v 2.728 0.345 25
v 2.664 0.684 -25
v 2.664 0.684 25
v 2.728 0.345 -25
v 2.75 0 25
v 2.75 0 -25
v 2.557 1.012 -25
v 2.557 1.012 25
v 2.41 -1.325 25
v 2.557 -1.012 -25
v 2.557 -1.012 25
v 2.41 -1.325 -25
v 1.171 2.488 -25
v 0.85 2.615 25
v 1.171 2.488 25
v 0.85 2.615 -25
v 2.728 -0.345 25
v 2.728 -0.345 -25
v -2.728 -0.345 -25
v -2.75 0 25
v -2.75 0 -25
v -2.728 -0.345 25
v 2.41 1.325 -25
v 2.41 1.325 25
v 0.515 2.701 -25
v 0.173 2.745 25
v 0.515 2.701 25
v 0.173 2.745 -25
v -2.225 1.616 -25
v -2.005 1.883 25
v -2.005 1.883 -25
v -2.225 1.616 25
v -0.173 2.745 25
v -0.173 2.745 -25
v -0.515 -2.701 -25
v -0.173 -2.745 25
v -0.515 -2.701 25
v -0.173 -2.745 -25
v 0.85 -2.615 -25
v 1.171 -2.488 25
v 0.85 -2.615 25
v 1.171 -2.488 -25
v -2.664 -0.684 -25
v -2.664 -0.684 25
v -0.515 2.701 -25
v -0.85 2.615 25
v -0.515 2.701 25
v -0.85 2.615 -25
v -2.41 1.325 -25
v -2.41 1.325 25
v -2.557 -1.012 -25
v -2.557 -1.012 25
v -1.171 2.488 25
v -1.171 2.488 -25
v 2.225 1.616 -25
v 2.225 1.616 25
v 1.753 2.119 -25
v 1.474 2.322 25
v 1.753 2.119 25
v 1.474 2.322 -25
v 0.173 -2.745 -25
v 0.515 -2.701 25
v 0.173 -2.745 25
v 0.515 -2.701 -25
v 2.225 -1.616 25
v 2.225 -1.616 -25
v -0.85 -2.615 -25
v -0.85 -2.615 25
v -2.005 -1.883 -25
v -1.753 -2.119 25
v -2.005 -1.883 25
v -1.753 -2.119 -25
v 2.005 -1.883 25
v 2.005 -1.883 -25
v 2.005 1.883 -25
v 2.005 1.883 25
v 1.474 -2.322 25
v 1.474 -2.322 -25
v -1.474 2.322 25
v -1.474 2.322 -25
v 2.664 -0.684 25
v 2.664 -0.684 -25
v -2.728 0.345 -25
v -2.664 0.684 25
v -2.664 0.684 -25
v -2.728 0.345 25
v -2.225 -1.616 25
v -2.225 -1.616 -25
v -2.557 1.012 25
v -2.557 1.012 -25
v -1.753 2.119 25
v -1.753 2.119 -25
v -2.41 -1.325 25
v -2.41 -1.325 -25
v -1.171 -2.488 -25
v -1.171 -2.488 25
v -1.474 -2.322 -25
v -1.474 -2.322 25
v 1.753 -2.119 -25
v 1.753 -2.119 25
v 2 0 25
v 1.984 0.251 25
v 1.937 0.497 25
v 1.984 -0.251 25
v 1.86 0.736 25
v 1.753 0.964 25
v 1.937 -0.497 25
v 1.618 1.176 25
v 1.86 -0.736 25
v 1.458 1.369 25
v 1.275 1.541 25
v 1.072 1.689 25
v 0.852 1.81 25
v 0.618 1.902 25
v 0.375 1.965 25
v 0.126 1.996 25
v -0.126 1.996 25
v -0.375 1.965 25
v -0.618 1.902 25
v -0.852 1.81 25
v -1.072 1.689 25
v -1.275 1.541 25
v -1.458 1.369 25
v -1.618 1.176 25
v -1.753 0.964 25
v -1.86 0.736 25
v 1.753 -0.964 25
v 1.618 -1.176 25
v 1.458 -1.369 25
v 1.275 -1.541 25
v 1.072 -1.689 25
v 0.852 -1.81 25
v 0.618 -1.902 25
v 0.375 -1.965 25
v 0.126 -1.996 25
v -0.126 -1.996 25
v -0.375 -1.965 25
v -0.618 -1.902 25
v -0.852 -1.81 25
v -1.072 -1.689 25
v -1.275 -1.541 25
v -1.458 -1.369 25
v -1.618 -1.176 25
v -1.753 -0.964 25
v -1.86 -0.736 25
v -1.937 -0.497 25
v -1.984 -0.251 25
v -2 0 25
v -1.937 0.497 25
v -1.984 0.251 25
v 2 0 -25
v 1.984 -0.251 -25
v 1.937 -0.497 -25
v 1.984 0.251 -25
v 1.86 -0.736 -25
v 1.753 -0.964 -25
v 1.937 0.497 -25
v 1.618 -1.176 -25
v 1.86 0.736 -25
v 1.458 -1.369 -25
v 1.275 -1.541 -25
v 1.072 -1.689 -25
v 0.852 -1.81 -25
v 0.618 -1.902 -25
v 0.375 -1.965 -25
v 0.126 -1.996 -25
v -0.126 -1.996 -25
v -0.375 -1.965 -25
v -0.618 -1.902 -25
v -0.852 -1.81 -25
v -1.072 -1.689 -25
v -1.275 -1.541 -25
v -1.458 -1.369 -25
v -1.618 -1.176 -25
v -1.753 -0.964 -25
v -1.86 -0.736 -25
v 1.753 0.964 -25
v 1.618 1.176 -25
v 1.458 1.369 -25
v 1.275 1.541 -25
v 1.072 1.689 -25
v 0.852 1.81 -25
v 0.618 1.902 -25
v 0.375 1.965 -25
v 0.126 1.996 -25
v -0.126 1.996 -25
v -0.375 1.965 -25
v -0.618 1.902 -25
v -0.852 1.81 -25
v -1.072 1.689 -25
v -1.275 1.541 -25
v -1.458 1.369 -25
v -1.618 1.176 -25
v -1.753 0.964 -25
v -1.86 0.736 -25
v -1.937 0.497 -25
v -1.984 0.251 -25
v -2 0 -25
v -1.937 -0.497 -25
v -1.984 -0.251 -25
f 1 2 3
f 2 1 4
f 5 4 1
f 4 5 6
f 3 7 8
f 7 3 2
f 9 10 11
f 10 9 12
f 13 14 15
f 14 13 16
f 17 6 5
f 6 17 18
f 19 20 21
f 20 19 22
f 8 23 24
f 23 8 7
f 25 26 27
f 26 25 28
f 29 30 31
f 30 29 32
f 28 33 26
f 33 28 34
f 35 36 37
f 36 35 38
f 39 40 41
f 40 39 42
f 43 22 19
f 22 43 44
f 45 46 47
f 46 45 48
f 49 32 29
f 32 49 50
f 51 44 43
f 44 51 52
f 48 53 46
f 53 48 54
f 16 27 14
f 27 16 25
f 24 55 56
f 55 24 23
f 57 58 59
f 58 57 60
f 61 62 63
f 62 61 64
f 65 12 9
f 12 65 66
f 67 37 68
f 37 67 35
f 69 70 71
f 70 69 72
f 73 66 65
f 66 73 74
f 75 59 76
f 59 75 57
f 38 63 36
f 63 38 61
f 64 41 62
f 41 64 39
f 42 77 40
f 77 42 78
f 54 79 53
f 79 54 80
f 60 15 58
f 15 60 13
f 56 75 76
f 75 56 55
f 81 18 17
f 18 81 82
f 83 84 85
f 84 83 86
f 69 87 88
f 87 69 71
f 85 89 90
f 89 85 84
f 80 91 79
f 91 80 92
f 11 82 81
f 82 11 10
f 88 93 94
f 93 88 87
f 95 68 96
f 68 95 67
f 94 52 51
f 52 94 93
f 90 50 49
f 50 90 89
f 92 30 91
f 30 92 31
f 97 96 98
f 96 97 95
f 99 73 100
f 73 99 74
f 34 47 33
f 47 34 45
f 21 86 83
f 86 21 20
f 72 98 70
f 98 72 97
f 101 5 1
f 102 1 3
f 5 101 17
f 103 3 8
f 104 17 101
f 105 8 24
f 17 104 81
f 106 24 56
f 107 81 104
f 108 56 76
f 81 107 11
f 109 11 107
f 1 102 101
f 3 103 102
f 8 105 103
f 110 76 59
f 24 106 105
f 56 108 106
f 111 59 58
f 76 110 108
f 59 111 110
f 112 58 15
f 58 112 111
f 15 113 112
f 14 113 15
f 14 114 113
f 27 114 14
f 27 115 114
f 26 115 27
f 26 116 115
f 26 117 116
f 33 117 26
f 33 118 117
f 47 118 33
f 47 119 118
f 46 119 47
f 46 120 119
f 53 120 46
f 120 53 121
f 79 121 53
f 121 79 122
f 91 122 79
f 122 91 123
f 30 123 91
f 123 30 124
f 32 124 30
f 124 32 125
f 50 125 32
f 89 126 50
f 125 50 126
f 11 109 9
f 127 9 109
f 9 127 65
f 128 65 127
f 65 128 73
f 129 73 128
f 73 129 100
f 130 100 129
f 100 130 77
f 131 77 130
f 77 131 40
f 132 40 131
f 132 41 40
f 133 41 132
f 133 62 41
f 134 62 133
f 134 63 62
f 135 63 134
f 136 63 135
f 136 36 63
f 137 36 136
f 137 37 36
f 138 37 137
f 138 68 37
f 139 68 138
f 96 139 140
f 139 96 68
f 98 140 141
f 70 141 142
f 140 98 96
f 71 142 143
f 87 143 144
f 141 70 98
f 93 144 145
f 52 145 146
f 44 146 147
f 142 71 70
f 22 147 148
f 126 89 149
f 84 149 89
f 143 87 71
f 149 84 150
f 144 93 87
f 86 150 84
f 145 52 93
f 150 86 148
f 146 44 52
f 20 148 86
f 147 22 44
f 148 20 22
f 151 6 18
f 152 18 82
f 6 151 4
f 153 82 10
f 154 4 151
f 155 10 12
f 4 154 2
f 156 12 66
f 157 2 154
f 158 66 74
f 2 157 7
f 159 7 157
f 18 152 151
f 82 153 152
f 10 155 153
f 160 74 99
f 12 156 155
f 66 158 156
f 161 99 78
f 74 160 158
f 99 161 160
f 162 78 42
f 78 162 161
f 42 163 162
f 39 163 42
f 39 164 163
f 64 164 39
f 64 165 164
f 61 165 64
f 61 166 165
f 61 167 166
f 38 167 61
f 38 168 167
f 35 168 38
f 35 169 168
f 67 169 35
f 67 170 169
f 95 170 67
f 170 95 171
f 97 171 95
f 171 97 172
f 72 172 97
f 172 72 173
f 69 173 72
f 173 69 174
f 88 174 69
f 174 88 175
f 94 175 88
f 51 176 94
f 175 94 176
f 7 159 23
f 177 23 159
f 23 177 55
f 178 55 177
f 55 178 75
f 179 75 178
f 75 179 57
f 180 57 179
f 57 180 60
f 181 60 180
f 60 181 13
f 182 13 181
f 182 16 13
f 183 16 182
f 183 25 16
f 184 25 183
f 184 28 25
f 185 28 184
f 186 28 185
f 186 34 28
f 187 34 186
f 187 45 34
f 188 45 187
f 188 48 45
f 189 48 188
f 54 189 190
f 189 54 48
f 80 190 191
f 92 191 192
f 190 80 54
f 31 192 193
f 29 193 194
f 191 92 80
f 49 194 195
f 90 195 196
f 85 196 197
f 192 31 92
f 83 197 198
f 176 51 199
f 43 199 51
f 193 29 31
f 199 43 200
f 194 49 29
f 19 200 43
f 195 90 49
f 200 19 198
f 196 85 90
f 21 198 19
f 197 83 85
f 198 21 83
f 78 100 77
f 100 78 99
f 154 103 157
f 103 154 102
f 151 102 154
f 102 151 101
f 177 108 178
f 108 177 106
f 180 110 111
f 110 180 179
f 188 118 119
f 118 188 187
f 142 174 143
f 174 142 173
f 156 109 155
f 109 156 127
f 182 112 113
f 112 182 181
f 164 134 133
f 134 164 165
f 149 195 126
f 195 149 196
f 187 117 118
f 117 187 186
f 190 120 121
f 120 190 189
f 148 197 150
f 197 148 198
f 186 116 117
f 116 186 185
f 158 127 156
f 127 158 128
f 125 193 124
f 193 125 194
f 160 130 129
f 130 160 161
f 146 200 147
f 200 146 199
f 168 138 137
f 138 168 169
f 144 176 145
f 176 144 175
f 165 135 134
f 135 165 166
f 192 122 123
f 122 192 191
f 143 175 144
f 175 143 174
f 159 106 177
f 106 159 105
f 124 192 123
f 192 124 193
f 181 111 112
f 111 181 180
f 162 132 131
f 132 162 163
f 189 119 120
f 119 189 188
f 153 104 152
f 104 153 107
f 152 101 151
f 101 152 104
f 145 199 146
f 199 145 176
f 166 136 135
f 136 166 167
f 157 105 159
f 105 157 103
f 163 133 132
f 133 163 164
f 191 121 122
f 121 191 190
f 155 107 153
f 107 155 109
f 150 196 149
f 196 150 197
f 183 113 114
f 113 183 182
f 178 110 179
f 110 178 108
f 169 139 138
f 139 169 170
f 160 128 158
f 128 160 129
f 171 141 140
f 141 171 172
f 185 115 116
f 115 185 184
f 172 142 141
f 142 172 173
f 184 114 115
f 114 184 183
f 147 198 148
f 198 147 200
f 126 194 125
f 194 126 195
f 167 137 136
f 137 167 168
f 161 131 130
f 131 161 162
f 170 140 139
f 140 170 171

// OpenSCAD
$fn = 50;


difference() {
	union() {
		translate(v = [0, 0, -25.0000000000]) {
			cylinder(h = 50, r = 2.7500000000);
		}
	}
	union() {
		translate(v = [0, 0, -100.0000000000]) {
			cylinder(h = 200, r = 2.0000000000);
		}
	}
}
